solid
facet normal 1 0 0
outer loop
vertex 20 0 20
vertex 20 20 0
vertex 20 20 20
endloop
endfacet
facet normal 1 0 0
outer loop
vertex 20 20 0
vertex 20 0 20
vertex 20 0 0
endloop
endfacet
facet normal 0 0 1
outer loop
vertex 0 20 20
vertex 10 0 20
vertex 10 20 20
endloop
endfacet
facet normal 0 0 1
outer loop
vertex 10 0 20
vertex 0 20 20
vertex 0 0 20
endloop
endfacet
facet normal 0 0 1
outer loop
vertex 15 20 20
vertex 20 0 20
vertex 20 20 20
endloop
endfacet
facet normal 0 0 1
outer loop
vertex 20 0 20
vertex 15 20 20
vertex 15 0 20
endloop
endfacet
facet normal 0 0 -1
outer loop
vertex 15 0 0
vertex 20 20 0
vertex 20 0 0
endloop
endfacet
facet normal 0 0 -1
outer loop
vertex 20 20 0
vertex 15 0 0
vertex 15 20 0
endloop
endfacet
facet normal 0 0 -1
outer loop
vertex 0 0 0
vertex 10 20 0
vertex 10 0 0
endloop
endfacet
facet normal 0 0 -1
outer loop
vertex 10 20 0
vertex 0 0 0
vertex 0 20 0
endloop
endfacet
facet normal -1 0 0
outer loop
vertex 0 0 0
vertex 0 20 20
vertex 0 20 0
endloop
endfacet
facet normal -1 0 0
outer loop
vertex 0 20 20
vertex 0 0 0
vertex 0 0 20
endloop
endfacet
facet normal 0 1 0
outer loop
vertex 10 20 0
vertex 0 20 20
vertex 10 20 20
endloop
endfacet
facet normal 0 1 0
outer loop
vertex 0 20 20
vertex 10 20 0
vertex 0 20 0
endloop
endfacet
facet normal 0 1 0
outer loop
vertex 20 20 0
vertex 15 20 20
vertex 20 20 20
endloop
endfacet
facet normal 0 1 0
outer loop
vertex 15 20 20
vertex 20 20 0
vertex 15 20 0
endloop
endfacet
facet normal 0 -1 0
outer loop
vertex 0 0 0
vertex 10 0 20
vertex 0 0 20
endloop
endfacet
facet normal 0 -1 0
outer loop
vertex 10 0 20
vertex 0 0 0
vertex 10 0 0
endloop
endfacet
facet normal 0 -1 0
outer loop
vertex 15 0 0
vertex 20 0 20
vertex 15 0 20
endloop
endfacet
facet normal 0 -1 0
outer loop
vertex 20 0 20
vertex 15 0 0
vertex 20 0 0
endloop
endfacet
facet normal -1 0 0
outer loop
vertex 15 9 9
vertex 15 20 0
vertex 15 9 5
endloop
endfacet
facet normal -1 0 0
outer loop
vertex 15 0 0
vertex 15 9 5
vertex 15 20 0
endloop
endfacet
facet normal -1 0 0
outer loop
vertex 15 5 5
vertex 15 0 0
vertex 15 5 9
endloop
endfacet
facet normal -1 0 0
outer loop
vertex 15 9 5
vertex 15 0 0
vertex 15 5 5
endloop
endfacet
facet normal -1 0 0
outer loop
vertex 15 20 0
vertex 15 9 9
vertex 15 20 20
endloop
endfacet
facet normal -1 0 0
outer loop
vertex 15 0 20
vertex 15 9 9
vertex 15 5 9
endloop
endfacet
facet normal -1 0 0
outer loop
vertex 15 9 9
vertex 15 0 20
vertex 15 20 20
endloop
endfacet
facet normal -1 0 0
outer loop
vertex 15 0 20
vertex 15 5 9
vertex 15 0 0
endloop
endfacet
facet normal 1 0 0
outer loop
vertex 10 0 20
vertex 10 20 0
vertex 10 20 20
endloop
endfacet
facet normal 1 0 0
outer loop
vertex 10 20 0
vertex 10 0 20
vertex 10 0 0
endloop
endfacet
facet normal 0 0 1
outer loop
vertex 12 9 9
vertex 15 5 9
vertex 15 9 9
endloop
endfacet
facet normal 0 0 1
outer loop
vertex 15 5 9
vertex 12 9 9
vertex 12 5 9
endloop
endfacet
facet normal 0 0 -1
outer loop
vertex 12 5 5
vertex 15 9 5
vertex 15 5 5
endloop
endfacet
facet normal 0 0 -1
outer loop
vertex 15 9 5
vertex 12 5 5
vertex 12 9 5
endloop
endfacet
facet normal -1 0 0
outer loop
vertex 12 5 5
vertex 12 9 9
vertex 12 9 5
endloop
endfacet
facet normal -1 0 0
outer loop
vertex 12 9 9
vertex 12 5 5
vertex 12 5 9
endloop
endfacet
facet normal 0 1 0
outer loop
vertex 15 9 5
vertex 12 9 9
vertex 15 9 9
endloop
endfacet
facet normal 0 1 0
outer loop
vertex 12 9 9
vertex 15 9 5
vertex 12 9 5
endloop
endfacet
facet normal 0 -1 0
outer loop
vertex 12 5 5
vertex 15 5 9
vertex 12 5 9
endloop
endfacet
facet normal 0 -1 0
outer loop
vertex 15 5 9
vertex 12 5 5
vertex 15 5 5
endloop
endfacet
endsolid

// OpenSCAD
// Part 1 is a cube with a slab (x 10..15) subtracted. Part 2 straddles the
// slab and the remaining material (x 12..18), so the collision is x 15..18
// (volume 48). The subtracted slab's bounding box overlaps part 2 too, but it
// removes material, so it must not appear among the colliding primitives.
difference() {
  cube(20);
  translate([10, -1, -1]) cube([5, 22, 22]);
}
translate([12, 5, 5]) cube([6, 4, 4]);
